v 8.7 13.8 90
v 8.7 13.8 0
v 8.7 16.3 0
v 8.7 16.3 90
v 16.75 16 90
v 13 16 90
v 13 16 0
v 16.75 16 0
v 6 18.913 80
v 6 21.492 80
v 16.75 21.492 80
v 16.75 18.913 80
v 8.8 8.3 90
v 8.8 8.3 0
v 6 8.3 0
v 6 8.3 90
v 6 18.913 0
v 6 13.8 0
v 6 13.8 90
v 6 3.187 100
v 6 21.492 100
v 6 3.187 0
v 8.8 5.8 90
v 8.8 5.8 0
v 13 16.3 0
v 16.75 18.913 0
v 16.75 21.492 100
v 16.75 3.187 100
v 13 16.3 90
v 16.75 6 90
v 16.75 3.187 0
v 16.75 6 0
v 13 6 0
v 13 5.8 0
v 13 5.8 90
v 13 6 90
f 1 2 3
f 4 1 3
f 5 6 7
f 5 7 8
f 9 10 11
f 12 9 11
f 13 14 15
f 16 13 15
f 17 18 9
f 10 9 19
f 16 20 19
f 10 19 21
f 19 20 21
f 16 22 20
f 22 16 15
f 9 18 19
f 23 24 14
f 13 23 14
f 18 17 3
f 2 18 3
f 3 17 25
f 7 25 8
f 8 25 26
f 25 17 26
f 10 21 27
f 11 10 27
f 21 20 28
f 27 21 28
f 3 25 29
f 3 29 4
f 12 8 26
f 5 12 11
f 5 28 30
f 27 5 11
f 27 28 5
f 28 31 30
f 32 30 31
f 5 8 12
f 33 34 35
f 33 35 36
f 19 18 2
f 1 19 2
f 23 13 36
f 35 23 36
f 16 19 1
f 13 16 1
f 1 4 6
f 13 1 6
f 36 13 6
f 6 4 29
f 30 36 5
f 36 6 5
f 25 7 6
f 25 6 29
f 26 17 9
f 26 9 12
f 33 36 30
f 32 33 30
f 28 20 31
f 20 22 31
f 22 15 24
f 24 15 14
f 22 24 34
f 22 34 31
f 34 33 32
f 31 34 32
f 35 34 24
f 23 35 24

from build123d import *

# Parameters (mm, degrees)
SKETCH2_W           = 3.75
SKETCH2_H           = 0.3
SKETCH2_H_2         = 0.2
BOSS_EXTRUDE3_DEPTH = 90
SKETCH3_W           = 10.75
SKETCH3_H           = 15.726491146
BOSS_EXTRUDE4_DEPTH = 10
SKETCH4_W           = 10.75
SKETCH4_H           = 2.578461227
BOSS_EXTRUDE5_DEPTH = 20


with BuildPart() as part:
    # Sketch2 → Boss-Extrude3 (new body)
    with BuildSketch(Plane.XY):
        with Locations((14.875, 16.15)):
            Rectangle(SKETCH2_W, SKETCH2_H)
        Polygon((8.7, 16.3), (8.7, 18.913245573), (16.75, 18.913245573), (16.75, 16.3), (13, 16.3), align=None)
        Polygon((6, 18.913245573), (6, 13.8), (8.7, 13.8), (8.7, 16.3), (8.7, 18.913245573), align=None)
        Polygon((8.8, 3.186754427), (8.8, 5.8), (8.8, 8.3), (6, 8.3), (6, 3.186754427), align=None)
        Polygon((8.8, 5.8), (13, 5.8), (16.75, 5.8), (16.75, 3.186754427), (8.8, 3.186754427), align=None)
        with Locations((14.875, 5.9)):
            Rectangle(SKETCH2_W, SKETCH2_H_2)
    extrude(amount=BOSS_EXTRUDE3_DEPTH)

    # Sketch3 → Boss-Extrude4 (add)
    with BuildSketch(Plane.XY.offset(90)):
        with Locations((11.375, 11.05)):
            Rectangle(SKETCH3_W, SKETCH3_H)
    extrude(amount=BOSS_EXTRUDE4_DEPTH)

    # Sketch4 → Boss-Extrude5 (add)
    with BuildSketch(Plane.XY.offset(100)):
        with Locations((11.375, 20.202476187)):
            Rectangle(SKETCH4_W, SKETCH4_H)
    extrude(amount=-BOSS_EXTRUDE5_DEPTH)


solid = part.part
